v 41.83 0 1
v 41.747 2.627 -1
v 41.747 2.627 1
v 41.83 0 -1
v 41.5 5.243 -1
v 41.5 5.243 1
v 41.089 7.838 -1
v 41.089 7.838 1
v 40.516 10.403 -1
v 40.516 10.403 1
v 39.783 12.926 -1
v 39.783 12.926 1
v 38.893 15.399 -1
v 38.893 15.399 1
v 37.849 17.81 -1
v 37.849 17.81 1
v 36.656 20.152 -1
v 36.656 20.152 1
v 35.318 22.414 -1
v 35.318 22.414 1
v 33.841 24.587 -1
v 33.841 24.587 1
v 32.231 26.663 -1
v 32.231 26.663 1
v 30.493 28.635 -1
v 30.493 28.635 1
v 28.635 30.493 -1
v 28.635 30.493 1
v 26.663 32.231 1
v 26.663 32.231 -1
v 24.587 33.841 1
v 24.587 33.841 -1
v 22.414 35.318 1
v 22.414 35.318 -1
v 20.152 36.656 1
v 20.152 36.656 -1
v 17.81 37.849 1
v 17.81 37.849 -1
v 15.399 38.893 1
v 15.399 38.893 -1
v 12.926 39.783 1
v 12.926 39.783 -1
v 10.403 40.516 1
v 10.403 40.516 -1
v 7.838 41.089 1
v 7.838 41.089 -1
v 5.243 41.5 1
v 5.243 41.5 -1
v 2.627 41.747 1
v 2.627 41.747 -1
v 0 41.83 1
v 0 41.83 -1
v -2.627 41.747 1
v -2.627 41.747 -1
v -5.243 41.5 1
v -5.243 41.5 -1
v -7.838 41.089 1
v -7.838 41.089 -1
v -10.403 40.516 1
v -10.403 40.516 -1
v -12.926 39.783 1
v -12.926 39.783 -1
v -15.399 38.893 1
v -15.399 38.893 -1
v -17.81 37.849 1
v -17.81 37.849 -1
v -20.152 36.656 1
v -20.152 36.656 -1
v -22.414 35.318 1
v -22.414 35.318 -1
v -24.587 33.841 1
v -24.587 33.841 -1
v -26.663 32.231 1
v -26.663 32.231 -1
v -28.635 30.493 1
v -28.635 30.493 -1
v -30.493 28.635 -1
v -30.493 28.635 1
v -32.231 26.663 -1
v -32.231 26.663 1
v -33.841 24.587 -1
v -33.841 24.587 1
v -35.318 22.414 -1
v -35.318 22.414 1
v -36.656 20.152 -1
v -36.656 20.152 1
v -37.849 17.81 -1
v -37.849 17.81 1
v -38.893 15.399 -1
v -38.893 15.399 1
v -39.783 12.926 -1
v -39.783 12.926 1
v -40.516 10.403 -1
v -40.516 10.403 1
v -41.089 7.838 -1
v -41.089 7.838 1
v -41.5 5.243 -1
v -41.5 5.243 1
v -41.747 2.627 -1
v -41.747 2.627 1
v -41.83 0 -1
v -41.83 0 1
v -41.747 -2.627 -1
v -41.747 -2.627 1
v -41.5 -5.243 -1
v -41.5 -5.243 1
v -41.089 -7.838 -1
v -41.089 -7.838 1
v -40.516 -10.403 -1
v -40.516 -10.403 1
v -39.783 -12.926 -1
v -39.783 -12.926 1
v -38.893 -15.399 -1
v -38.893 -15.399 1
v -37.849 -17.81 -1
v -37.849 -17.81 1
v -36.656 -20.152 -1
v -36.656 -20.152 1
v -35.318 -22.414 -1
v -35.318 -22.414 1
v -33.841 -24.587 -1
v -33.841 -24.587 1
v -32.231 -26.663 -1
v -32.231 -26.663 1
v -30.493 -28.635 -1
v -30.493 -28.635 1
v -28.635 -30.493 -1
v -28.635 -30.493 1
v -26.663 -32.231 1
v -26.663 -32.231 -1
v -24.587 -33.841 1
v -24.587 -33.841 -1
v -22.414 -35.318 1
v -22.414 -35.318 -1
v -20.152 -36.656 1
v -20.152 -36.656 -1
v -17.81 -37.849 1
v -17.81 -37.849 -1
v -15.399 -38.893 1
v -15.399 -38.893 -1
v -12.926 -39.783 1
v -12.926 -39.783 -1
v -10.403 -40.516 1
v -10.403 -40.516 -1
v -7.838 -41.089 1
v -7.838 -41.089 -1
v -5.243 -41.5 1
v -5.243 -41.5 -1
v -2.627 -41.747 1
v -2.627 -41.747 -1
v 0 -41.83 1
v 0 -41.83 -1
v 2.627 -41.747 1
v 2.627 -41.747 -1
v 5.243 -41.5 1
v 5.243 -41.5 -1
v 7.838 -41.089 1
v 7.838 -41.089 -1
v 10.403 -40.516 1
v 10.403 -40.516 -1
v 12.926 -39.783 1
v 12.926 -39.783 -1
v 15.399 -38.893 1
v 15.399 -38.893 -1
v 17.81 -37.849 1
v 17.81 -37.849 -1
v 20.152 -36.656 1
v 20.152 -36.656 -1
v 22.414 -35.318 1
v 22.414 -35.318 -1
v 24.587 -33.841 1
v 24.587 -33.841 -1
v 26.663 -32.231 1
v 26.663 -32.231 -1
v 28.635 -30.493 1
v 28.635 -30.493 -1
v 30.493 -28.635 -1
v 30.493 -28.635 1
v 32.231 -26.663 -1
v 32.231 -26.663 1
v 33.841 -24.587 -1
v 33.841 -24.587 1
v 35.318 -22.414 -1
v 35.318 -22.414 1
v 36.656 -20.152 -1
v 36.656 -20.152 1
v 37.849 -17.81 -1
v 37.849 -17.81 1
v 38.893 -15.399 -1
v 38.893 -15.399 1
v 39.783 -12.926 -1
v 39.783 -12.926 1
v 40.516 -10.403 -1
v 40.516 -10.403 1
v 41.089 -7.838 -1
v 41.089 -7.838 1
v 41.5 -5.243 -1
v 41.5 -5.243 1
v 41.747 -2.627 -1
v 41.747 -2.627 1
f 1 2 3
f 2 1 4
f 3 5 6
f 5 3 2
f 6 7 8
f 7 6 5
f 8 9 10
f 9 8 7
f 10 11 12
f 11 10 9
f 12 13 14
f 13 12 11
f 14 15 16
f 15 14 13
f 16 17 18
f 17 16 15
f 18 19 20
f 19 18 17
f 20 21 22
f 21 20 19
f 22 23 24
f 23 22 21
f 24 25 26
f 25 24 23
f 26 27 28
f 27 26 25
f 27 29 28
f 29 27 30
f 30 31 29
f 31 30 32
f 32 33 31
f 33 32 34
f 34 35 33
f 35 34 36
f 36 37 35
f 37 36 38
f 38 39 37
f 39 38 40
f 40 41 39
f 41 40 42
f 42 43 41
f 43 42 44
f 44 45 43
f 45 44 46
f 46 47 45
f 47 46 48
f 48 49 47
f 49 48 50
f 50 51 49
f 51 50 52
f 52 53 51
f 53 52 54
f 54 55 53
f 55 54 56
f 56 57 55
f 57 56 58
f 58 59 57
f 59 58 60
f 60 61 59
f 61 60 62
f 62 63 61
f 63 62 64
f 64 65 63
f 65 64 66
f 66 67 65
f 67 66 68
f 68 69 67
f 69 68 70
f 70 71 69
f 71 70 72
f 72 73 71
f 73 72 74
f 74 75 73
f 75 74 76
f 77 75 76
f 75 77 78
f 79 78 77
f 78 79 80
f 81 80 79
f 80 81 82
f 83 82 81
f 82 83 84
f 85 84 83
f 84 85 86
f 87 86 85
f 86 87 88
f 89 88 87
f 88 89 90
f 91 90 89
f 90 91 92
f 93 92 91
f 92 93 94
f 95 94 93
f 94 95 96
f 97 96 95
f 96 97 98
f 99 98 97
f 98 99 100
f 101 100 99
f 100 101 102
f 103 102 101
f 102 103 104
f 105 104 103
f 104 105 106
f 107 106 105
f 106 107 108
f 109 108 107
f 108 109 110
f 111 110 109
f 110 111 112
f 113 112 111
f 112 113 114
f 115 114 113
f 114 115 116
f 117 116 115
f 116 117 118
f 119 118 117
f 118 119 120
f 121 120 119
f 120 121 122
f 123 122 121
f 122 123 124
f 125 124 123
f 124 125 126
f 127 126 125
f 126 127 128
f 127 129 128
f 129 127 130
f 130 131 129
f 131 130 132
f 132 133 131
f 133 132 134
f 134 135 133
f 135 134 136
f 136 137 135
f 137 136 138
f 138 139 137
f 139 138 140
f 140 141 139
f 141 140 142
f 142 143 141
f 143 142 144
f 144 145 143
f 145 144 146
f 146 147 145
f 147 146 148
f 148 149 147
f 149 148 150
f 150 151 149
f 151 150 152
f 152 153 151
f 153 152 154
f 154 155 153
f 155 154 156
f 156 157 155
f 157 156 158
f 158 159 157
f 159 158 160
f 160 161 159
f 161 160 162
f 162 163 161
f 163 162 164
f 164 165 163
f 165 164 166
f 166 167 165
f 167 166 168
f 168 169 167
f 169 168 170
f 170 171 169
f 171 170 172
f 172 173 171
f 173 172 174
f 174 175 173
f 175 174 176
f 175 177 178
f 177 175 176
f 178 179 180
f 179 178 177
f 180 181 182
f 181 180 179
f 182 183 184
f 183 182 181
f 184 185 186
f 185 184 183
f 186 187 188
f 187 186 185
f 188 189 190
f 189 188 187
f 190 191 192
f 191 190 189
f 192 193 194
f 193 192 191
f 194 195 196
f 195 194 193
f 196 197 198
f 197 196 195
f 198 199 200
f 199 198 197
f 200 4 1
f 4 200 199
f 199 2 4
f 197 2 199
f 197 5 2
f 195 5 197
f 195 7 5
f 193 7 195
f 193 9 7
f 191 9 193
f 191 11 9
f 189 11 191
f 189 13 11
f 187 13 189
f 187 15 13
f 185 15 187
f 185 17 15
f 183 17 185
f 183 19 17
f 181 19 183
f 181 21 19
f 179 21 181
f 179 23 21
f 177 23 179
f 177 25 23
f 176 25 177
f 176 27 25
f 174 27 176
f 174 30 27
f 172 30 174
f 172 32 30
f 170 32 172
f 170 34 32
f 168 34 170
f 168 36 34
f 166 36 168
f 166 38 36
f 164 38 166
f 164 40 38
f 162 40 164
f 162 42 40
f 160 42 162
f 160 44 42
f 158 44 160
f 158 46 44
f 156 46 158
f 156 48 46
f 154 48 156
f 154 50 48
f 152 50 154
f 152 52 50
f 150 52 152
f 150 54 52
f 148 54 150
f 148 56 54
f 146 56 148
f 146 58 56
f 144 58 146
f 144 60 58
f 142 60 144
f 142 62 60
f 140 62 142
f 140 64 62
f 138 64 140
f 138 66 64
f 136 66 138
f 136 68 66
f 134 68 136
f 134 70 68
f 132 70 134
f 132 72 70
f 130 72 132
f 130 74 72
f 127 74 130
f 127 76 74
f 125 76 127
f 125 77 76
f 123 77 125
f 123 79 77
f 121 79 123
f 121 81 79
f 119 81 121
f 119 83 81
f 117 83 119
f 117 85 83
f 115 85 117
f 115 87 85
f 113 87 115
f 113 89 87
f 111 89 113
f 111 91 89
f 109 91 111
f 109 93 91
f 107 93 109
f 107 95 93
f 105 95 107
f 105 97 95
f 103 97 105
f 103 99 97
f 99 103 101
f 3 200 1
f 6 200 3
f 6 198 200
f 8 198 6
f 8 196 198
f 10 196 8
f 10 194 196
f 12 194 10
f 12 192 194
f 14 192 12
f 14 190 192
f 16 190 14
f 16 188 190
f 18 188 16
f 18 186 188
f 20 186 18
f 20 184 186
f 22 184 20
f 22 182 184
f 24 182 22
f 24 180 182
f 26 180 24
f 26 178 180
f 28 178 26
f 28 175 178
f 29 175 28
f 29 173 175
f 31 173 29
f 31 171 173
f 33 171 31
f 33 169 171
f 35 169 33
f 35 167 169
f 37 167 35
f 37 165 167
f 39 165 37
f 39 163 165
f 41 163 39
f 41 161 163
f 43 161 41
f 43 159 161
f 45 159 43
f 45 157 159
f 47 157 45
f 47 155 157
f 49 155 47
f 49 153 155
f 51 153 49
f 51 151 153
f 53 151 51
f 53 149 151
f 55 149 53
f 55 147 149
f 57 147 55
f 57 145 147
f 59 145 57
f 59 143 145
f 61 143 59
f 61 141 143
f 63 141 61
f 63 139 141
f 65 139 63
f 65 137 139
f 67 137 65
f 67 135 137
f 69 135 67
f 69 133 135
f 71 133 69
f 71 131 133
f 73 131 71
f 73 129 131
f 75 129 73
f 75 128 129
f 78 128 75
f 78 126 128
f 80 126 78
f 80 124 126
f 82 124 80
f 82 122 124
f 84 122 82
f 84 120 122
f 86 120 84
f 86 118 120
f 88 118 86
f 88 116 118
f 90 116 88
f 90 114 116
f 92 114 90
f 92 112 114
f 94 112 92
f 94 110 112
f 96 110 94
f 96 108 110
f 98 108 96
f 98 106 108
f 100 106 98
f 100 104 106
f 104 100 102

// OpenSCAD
// file: lib.scad
N              = 10+5;
M              =  5;
FACET          = 20;
PROTUDE        =  2.5;
RADIUS         = 45;
H              = FACET * M;
TH             =  0.7;
ARM_WIDTH      = 31;//25;
ARM_THICKNESS  = 17;
WALL           = 0.8;
CLAW_THICKNESS = 17;
CLAW_POS       = 15;
TOLERANCE      = .17*2;

ATOM           =  0.01;

$fn = 100;

module ring(inset=0) {

    d = RADIUS*2*PI / N;

    for(j=[0:M-1]) {
        for (i=[0:N-1]) {
            translate([0, 0, j*FACET])
            rotate([0, 0, 360/N*i])
            translate([RADIUS-inset, 0, FACET/2])
            rotate([0, 90, 0])
            hull() {
                translate([0, 0, -5/2])
                cube([FACET, d+.3, 5], center=true);

                translate([0, 0, PROTUDE])
                cube([ATOM, ATOM, ATOM], center=true);
            }
        }
    }
}

module goblet() {
    difference() {
        ring();
        ring(inset=WALL);
    }

    difference() {
        intersection() {
            hull() ring();
            translate([0, 0, H-TH])
            cylinder(r=60, h=TH);
        }

        translate([0, 0, H]) {
            intersection() {
                cylinder(d=ARM_WIDTH, h=H, center=true);
                cube([ARM_WIDTH*2, ARM_THICKNESS, H], center=true);
            }
        }
    }
}


module base() {
    l = RADIUS*2*.75;
    w_ext = 25;
    w_int = CLAW_THICKNESS;
    th = 2;
    h = 10;

    difference() {        
        translate([-l/2, -w_ext/2, 0])
        cube([l, w_ext, h]);

        translate([-CLAW_POS, -w_int/2, th])
        cube([l, w_int, h]);

        translate([-CLAW_POS - l - 5, -w_int/2, th])
        cube([l, w_int, h]);


    }

    difference() {
        intersection() {
            hull() ring(inset=WALL+TOLERANCE);
            cylinder(r=60, h=th);
        }
        
        cylinder(r=RADIUS*.70, h=th*3, center=true);
    }
}

goblet();

translate([RADIUS*2+5, 0, 0])
base();
// main file
use <lib.scad>

RADIUS = 45;
TOLERANCE = .17;
cylinder(r=RADIUS-3 -TOLERANCE, h=2, $fn=100, center=true);
